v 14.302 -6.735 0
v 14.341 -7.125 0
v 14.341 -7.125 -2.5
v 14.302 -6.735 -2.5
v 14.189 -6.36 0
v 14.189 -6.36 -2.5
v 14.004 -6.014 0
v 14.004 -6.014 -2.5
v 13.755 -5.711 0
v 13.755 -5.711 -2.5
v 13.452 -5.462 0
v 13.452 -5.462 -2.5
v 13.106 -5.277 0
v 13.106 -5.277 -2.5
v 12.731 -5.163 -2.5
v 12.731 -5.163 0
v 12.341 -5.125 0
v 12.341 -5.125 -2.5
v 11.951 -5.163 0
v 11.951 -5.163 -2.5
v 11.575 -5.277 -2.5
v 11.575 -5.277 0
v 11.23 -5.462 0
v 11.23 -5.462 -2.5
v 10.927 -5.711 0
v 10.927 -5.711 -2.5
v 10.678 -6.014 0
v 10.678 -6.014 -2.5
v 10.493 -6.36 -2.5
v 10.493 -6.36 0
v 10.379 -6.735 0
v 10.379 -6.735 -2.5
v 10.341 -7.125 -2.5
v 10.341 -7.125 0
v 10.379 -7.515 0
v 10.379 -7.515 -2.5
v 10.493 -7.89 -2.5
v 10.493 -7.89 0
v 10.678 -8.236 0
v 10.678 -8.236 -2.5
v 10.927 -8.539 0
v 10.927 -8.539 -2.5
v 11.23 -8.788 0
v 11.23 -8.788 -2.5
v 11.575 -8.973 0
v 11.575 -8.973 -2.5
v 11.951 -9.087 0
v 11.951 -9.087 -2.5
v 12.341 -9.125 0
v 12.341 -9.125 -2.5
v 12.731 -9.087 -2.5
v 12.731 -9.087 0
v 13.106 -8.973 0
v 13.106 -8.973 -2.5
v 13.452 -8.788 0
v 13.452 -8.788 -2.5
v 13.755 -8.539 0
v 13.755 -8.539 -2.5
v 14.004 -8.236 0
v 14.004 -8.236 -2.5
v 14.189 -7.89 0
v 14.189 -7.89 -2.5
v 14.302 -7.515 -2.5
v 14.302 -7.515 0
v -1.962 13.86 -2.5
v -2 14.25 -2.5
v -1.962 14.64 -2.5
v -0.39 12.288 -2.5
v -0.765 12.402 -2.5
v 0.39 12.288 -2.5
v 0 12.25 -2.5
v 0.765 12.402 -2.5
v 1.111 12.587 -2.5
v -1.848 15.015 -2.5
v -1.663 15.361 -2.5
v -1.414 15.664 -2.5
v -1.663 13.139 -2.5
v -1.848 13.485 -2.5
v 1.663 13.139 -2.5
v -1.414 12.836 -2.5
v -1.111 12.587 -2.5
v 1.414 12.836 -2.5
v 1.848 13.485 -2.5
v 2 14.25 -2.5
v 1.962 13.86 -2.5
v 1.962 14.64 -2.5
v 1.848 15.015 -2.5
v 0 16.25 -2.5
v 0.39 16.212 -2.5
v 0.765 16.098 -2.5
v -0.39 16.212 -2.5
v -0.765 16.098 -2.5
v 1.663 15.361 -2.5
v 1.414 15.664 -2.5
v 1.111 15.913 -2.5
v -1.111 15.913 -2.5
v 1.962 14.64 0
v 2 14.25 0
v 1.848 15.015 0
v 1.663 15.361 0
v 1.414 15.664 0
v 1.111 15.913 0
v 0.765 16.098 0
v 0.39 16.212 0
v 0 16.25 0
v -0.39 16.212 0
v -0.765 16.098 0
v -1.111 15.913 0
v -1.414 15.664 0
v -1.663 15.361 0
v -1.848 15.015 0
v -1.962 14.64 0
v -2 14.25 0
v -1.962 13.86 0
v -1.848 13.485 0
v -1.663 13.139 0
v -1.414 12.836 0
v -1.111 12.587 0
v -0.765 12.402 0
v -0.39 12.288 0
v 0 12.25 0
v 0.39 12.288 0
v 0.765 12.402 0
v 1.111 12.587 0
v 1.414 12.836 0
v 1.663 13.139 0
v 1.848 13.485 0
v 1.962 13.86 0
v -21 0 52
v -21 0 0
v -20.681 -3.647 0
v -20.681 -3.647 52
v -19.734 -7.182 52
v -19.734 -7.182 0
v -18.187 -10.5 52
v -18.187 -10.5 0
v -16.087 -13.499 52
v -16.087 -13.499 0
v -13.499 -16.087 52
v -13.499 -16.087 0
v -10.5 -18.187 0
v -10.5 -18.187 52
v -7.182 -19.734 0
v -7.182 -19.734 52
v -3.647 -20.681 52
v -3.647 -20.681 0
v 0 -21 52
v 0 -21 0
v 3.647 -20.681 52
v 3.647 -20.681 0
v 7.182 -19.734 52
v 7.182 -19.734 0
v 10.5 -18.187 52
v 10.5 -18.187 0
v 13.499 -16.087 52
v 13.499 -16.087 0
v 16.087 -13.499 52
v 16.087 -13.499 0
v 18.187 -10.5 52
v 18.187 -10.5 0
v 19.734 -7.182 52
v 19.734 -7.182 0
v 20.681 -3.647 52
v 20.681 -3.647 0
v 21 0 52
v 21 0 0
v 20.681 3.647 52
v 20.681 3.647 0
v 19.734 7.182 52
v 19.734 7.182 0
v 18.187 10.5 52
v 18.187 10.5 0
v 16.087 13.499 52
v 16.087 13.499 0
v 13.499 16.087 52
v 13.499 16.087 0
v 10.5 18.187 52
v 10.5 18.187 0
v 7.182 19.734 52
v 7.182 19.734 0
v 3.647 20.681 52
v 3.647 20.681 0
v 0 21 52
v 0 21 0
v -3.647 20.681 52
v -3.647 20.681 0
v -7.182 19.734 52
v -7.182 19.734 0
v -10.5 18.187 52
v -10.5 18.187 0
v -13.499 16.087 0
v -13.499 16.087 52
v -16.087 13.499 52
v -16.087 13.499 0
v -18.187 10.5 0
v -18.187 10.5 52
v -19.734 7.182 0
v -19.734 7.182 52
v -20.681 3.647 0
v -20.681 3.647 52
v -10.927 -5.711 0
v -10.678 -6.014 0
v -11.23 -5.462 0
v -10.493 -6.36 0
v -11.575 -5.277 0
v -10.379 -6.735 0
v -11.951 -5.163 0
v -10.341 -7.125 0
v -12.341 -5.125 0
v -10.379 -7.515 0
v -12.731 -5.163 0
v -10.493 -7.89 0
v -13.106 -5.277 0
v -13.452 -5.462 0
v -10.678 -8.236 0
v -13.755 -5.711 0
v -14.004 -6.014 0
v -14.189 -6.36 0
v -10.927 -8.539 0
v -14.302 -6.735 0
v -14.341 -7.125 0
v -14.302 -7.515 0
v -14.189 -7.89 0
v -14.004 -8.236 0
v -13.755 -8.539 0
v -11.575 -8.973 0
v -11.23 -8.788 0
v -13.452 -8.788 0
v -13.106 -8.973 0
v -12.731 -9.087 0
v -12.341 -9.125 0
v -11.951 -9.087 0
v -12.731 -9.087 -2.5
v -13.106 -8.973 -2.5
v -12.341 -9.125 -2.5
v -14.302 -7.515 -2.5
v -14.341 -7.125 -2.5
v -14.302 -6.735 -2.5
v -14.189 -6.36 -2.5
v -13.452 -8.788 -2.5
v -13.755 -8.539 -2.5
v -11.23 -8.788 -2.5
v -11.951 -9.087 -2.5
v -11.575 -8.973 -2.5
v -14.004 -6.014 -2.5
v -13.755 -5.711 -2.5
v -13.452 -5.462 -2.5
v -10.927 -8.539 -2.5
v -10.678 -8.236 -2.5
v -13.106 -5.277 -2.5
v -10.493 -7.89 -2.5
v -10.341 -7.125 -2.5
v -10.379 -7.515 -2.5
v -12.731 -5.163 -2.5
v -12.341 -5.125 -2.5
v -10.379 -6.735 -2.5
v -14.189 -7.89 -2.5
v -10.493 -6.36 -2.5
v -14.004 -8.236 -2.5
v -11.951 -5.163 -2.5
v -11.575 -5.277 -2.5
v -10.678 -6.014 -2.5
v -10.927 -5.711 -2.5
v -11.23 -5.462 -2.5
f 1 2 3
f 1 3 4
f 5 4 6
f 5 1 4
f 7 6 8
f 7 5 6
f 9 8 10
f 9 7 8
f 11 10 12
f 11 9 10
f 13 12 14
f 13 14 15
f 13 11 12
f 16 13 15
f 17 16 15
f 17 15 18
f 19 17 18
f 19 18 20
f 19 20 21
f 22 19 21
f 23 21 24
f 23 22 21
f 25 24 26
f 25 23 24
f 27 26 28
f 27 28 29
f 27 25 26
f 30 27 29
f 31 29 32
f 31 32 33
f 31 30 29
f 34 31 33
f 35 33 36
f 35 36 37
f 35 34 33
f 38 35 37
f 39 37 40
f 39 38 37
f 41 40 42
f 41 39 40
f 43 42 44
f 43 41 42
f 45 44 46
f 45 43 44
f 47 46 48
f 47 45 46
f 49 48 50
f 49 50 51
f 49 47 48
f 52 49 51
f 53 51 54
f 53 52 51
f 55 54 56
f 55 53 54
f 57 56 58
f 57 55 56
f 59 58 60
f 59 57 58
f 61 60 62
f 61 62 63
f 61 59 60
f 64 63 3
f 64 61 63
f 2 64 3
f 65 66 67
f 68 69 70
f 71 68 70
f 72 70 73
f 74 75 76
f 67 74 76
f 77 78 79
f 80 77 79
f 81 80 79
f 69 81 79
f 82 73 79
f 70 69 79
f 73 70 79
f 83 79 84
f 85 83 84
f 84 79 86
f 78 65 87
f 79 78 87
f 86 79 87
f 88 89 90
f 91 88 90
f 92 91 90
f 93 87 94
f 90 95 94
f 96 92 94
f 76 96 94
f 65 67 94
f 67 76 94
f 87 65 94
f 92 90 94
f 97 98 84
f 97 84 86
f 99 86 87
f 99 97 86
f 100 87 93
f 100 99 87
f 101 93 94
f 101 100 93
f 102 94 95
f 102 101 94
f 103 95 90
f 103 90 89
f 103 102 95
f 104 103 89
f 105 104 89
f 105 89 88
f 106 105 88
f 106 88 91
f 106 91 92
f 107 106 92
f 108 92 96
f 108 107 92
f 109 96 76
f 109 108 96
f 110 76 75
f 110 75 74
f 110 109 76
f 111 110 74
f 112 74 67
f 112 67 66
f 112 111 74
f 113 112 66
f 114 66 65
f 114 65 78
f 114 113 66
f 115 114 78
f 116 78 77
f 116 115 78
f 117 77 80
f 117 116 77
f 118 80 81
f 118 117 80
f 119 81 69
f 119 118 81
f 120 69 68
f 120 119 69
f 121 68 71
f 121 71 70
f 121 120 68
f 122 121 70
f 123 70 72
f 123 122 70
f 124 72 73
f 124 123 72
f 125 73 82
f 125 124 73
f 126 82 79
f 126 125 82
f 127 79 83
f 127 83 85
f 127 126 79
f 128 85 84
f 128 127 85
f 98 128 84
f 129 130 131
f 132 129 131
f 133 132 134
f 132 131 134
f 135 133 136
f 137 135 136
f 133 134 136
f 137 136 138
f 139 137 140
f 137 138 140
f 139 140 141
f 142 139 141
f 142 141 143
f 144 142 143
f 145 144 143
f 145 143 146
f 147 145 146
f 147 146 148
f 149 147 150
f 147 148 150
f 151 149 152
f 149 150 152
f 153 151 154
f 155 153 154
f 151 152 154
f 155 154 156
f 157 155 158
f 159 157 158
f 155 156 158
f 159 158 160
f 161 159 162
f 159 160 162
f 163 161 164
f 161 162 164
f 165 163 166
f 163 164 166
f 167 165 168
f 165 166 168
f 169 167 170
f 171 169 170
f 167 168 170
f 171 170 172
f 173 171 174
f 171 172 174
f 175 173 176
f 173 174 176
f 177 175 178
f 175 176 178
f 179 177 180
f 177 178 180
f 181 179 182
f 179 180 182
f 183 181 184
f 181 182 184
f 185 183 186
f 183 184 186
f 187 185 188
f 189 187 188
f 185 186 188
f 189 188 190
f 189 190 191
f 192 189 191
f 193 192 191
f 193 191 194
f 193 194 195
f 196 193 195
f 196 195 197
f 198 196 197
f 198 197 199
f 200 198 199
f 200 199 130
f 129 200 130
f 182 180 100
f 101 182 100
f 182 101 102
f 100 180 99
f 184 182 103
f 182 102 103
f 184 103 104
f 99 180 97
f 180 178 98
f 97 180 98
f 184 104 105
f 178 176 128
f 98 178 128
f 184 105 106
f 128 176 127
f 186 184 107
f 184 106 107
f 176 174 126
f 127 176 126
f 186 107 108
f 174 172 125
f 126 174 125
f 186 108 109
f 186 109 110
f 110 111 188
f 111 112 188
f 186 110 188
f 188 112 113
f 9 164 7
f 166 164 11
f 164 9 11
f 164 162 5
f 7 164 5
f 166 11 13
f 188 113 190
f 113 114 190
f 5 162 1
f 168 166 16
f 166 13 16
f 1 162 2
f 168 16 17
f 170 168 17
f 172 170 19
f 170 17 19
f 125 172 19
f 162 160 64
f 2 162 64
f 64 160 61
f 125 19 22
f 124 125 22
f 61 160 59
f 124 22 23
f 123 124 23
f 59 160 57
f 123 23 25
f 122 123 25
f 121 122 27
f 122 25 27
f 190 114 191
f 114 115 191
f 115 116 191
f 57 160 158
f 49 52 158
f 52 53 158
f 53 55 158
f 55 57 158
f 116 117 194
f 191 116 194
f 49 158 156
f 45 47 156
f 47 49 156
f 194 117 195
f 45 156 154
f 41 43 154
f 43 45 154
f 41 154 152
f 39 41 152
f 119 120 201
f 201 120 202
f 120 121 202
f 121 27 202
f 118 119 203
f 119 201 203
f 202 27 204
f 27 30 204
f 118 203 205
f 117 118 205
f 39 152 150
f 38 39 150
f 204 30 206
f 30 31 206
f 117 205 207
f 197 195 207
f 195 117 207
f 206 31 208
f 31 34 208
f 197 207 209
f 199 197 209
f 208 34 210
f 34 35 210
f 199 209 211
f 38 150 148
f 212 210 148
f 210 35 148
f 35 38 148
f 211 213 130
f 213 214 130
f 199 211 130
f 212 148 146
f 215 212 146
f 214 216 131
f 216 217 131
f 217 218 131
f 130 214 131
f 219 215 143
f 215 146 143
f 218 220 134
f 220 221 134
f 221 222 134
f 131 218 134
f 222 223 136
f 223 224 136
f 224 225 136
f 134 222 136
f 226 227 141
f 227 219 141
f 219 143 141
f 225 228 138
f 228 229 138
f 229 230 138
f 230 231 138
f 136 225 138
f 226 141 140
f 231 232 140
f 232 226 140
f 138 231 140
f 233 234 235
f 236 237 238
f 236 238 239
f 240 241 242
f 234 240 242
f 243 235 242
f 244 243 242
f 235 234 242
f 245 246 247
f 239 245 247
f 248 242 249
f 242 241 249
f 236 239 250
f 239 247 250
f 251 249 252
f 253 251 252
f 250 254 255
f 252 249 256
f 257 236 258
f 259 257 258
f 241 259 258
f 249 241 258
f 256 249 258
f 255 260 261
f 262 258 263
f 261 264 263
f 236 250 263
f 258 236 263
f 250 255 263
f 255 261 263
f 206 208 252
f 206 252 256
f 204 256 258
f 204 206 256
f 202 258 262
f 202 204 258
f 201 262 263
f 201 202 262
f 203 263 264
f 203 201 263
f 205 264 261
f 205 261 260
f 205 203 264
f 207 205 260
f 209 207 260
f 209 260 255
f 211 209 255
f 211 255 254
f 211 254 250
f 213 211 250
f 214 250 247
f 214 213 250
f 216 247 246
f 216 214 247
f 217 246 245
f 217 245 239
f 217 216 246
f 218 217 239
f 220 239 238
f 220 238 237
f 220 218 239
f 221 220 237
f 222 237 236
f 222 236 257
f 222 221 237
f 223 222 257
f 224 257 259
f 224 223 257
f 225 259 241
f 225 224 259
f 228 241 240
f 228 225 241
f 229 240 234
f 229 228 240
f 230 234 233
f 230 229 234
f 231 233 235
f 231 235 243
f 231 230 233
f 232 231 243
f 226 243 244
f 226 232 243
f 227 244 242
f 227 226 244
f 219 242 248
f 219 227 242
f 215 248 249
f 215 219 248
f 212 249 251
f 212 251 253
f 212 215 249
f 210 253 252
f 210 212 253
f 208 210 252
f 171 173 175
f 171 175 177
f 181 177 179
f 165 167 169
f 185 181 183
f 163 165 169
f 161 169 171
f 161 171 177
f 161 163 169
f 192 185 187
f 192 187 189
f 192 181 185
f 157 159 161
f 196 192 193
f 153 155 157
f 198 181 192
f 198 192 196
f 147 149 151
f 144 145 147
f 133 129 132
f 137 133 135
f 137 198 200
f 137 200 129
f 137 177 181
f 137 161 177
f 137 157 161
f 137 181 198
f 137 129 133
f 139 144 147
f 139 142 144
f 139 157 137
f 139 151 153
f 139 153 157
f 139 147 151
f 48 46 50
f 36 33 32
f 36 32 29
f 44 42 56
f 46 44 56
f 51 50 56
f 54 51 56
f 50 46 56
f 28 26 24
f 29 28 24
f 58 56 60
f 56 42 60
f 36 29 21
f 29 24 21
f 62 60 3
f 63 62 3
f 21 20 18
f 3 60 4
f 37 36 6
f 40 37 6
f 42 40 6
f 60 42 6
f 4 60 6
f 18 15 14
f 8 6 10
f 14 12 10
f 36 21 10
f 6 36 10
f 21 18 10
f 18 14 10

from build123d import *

# Parameters (mm, degrees)
SKETCH1_R           = 21
BOSS_EXTRUDE1_DEPTH = 52
SKETCH2_R           = 2
BOSS_EXTRUDE2_DEPTH = 2.5


with BuildPart() as part:
    # Sketch1 → Boss-Extrude1 (new body)
    with BuildSketch(Plane.XY):
        with Locations(Location((0, 0, 0), (0, 0, 180))):
            Circle(SKETCH1_R)
    extrude(amount=BOSS_EXTRUDE1_DEPTH)

    # Sketch2 → Boss-Extrude2 (add)
    with BuildSketch(Plane.XY):
        with Locations((0, 14.25)):
            Circle(SKETCH2_R)
        with Locations((12.340862004, -7.125)):
            Circle(SKETCH2_R)
        with Locations((-12.340862004, -7.125)):
            Circle(SKETCH2_R)
    extrude(amount=-BOSS_EXTRUDE2_DEPTH)


solid = part.part
